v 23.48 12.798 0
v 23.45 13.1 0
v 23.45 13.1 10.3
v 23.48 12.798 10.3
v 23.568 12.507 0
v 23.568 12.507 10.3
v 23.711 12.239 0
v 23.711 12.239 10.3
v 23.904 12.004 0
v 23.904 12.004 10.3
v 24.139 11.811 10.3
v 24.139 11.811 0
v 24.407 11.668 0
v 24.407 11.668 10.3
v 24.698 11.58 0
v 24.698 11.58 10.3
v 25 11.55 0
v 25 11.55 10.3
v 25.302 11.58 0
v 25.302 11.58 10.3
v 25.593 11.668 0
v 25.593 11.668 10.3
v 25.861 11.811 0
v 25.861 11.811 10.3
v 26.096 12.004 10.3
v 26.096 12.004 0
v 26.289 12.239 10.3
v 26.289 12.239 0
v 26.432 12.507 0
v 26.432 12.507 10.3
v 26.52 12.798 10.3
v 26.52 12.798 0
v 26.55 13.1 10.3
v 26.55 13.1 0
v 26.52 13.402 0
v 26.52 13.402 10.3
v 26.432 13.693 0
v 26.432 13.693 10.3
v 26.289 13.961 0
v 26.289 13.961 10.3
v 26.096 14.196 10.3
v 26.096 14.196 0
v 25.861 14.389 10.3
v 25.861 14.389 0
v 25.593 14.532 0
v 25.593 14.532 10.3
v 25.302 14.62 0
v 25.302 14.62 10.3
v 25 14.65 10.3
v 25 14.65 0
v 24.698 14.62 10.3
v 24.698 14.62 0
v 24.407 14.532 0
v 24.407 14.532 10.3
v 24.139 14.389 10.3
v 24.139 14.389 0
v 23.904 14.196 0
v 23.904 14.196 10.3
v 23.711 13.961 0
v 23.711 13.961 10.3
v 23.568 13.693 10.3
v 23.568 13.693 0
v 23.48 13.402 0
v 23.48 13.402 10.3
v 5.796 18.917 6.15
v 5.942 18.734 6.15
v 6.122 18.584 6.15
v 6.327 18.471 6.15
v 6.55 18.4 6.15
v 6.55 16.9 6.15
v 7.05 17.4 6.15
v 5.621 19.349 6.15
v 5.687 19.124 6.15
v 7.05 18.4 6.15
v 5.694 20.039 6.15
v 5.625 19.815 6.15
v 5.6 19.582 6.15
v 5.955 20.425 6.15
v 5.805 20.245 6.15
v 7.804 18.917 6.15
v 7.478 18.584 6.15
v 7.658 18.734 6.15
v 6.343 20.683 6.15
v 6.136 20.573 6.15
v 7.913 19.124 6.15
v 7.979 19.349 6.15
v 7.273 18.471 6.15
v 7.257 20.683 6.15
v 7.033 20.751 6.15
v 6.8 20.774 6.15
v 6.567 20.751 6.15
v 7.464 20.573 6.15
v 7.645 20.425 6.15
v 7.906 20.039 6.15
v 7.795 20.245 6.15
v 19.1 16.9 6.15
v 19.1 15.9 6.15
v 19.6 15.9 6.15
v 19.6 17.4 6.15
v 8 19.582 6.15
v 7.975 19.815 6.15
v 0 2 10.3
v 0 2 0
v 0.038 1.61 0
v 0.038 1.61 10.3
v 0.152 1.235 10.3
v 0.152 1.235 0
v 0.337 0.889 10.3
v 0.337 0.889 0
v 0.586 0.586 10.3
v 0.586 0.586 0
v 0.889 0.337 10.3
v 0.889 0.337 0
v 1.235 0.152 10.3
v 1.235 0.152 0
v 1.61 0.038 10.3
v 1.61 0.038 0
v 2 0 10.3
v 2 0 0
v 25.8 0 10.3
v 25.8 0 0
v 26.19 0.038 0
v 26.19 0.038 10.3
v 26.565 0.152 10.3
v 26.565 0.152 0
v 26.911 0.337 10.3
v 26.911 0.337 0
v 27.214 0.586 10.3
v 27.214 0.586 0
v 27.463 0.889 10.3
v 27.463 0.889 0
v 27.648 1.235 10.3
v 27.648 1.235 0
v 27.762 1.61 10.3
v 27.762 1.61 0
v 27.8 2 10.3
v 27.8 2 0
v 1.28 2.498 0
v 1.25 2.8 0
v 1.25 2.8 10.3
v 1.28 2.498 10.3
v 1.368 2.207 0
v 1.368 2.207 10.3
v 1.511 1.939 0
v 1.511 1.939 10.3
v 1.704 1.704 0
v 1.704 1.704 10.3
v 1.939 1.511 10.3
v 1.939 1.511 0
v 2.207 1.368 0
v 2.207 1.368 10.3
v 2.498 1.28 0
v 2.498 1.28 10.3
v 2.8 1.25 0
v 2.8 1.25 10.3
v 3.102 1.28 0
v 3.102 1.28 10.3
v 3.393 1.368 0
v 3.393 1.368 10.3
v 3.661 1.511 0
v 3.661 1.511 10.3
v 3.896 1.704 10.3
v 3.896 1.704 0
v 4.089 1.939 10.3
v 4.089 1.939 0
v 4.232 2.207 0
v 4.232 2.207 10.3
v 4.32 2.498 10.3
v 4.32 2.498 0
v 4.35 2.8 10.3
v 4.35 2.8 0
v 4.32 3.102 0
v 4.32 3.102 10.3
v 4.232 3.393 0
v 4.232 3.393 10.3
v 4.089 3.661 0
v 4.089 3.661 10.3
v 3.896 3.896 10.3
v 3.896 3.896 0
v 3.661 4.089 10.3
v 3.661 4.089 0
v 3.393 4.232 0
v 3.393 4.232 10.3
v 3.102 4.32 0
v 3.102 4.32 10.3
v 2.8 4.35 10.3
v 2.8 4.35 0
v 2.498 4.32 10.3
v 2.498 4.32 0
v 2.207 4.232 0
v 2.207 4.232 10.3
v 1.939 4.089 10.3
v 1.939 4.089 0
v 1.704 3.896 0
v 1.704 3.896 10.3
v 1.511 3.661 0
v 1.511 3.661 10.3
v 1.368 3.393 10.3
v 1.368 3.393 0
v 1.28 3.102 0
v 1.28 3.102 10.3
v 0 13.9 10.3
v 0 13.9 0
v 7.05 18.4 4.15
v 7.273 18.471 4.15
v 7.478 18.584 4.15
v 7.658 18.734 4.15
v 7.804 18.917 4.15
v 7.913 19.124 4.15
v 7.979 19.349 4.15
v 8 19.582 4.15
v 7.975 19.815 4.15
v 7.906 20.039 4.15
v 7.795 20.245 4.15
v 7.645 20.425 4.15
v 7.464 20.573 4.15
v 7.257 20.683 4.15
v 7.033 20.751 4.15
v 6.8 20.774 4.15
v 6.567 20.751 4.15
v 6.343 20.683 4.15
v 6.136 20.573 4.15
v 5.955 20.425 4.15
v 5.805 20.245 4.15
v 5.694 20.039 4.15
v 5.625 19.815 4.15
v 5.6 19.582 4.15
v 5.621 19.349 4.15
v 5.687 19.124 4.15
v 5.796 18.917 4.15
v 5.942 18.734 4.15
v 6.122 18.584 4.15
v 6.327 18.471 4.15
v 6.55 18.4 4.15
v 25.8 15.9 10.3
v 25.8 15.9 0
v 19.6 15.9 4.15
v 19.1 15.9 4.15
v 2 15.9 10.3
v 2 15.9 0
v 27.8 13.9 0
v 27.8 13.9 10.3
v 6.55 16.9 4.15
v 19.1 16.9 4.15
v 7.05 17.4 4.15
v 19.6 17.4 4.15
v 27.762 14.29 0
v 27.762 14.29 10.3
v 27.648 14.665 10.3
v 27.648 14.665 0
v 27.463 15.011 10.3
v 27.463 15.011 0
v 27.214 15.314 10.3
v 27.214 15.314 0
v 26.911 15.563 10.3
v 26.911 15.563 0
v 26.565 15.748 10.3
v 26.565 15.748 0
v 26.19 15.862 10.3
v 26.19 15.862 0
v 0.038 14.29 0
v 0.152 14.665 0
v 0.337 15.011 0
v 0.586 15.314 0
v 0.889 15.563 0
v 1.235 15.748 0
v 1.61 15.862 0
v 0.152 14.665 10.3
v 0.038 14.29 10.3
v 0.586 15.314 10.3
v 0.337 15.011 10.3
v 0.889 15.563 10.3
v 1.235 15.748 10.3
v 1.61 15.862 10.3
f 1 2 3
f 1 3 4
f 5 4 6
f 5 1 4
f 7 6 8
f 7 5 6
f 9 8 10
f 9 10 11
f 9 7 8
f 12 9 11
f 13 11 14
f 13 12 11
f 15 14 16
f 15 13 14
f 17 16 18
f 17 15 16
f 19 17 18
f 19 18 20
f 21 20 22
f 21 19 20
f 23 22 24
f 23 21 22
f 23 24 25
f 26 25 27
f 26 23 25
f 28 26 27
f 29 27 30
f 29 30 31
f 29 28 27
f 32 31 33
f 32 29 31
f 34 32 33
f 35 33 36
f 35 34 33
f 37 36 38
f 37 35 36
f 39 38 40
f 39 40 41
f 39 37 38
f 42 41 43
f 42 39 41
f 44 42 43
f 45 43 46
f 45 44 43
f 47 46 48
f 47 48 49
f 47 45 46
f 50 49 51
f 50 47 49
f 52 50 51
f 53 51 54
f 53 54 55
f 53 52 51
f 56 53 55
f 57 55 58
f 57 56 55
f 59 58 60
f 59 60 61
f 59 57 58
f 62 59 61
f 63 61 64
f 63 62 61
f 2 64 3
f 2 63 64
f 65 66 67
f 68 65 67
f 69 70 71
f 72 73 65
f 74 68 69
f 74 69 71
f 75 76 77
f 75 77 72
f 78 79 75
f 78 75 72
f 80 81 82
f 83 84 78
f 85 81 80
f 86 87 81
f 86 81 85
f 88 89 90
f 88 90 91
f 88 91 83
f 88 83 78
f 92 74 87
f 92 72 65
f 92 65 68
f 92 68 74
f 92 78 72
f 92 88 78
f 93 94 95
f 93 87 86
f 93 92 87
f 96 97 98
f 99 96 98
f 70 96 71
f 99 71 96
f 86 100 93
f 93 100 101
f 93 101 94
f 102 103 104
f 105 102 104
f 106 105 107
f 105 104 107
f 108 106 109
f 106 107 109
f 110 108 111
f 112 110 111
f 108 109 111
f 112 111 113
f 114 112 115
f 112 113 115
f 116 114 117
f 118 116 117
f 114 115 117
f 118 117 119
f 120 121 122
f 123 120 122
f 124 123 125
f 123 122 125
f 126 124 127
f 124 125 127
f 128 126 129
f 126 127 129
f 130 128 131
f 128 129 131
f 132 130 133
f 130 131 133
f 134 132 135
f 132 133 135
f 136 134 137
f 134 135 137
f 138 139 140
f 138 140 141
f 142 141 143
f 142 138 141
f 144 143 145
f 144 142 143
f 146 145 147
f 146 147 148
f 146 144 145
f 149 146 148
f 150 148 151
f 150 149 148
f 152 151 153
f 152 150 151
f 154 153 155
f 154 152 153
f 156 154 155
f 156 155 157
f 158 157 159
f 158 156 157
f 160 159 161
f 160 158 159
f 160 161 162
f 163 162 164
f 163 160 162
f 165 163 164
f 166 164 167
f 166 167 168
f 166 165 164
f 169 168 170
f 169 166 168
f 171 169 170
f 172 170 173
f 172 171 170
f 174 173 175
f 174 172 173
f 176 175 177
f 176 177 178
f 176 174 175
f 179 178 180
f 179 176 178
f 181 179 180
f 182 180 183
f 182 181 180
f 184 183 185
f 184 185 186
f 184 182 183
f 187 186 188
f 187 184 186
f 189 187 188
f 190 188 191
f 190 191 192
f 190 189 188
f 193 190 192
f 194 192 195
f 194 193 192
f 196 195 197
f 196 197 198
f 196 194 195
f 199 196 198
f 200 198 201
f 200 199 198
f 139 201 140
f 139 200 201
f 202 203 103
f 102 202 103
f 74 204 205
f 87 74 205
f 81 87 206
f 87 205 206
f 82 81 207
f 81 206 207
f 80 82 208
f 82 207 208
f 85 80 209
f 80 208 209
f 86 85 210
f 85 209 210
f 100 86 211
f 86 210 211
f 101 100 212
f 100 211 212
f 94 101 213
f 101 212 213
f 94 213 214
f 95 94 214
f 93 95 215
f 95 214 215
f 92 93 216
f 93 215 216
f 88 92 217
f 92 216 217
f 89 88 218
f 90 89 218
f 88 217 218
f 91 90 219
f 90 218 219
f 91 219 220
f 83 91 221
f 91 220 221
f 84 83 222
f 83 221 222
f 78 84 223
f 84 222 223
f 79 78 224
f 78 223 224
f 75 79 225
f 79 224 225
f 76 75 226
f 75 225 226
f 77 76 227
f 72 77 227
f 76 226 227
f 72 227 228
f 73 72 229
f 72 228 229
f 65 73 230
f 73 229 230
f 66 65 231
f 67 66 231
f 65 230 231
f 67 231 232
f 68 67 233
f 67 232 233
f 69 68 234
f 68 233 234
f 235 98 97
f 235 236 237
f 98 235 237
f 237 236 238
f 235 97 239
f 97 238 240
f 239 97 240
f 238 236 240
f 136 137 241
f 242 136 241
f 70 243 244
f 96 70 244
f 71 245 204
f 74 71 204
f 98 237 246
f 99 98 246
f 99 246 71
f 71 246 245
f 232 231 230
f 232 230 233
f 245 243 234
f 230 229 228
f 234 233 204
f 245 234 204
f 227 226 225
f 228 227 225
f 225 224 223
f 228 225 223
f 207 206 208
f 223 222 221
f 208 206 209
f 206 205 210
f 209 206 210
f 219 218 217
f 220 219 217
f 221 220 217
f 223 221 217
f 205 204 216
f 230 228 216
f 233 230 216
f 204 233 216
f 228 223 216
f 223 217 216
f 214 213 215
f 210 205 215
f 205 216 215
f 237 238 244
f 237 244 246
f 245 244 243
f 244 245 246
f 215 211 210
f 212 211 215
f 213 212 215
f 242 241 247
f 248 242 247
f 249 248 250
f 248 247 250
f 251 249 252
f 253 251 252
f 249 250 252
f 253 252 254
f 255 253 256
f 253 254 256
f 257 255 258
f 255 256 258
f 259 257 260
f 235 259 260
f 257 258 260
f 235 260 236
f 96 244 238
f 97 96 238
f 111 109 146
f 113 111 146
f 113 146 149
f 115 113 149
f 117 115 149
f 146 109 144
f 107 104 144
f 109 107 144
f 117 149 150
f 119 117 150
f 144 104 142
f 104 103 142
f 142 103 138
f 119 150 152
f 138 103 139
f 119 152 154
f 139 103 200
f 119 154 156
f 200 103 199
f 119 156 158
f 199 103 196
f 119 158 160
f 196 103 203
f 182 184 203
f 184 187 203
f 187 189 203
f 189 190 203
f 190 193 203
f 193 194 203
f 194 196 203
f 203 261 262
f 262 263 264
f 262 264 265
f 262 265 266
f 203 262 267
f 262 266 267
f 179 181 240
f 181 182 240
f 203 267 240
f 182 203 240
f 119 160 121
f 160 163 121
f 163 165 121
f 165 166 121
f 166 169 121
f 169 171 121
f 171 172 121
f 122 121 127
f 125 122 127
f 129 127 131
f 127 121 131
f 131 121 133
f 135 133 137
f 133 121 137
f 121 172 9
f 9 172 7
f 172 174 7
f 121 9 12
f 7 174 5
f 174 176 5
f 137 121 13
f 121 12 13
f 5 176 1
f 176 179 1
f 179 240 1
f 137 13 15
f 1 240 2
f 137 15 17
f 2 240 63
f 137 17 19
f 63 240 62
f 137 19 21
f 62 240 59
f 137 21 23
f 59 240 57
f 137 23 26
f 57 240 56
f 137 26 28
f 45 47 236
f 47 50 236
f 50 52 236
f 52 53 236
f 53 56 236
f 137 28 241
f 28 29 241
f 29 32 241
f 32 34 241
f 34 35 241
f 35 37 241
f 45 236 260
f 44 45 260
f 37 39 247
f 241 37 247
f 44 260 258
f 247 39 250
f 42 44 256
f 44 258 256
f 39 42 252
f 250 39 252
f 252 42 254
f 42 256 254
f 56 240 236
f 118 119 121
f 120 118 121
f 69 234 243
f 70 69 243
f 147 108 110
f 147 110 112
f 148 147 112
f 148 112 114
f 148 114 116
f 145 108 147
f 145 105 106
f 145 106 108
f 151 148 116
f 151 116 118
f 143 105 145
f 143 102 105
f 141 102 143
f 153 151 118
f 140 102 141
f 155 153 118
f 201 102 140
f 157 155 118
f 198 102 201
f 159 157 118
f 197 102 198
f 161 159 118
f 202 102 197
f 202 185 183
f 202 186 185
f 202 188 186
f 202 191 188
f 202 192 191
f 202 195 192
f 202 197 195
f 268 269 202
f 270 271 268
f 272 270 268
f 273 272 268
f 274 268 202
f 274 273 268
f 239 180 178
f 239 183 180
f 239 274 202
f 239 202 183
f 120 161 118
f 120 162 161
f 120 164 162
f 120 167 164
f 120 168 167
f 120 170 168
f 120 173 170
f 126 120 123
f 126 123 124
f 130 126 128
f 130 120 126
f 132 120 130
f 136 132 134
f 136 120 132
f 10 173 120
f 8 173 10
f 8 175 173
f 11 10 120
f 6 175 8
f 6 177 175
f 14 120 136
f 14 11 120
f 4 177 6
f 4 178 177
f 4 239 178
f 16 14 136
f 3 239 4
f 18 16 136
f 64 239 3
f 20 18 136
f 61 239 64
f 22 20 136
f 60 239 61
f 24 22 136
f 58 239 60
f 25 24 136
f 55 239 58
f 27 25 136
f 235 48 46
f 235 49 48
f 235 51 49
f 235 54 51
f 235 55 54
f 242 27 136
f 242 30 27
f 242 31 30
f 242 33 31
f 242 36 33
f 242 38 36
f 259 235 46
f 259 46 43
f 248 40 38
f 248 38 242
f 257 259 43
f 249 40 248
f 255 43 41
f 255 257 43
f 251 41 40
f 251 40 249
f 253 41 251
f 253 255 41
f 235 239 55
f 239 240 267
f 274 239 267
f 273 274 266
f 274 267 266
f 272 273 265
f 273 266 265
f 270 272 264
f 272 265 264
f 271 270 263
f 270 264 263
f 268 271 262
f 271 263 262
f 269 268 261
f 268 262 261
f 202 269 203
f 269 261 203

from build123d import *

# Parameters (mm, degrees)
SKETCH1_R                = 1.55
BOSS_EXTRUDE1_DEPTH      = 10.3
BOSS_EXTRUDE2_DEPTH      = 1
BOSS_EXTRUDE2_DEPTH_BACK = 1


with BuildPart() as part:
    # Sketch1 → Boss-Extrude1 (new body)
    with BuildSketch(Plane.XY):
        with BuildLine():
            Line((2, 0), (25.8, 0))
            ThreePointArc((25.8, 0), (27.214213562, 0.585786438), (27.8, 2))
            Line((27.8, 2), (27.8, 13.9))
            ThreePointArc((27.8, 13.9), (27.214213562, 15.314213562), (25.8, 15.9))
            Line((25.8, 15.9), (2, 15.9))
            ThreePointArc((2, 15.9), (0.585786438, 15.314213562), (0, 13.9))
            Line((0, 13.9), (0, 2))
            ThreePointArc((0, 2), (0.585786438, 0.585786438), (2, 0))
        make_face()
        with Locations(Location((2.8, 2.8, 0), (0, 0, 180))):
            Circle(SKETCH1_R, mode=Mode.SUBTRACT)
        with Locations(Location((25, 13.1, 0), (0, 0, 180))):
            Circle(SKETCH1_R, mode=Mode.SUBTRACT)
    extrude(amount=BOSS_EXTRUDE1_DEPTH)

    # Sketch2 → Boss-Extrude2 (add, two sides: drawn at the far end of the back side and taken through both)
    with BuildSketch(Plane.XY.offset(5.15).offset(-BOSS_EXTRUDE2_DEPTH_BACK)):
        with BuildLine():
            Line((6.55, 18.4), (6.55, 16.9))
            Line((6.55, 16.9), (7.05, 16.9))
            Line((7.05, 16.9), (19.1, 16.9))
            Line((19.1, 16.9), (19.1, 15.9))
            Line((19.1, 15.9), (19.6, 15.9))
            Line((19.6, 15.9), (19.6, 17.4))
            Line((19.6, 17.4), (7.05, 17.4))
            Line((7.05, 17.4), (7.05, 18.4))
            ThreePointArc((7.05, 18.4), (6.8, 20.773669459), (6.55, 18.4))
        make_face()
    extrude(amount=BOSS_EXTRUDE2_DEPTH + BOSS_EXTRUDE2_DEPTH_BACK)


solid = part.part
